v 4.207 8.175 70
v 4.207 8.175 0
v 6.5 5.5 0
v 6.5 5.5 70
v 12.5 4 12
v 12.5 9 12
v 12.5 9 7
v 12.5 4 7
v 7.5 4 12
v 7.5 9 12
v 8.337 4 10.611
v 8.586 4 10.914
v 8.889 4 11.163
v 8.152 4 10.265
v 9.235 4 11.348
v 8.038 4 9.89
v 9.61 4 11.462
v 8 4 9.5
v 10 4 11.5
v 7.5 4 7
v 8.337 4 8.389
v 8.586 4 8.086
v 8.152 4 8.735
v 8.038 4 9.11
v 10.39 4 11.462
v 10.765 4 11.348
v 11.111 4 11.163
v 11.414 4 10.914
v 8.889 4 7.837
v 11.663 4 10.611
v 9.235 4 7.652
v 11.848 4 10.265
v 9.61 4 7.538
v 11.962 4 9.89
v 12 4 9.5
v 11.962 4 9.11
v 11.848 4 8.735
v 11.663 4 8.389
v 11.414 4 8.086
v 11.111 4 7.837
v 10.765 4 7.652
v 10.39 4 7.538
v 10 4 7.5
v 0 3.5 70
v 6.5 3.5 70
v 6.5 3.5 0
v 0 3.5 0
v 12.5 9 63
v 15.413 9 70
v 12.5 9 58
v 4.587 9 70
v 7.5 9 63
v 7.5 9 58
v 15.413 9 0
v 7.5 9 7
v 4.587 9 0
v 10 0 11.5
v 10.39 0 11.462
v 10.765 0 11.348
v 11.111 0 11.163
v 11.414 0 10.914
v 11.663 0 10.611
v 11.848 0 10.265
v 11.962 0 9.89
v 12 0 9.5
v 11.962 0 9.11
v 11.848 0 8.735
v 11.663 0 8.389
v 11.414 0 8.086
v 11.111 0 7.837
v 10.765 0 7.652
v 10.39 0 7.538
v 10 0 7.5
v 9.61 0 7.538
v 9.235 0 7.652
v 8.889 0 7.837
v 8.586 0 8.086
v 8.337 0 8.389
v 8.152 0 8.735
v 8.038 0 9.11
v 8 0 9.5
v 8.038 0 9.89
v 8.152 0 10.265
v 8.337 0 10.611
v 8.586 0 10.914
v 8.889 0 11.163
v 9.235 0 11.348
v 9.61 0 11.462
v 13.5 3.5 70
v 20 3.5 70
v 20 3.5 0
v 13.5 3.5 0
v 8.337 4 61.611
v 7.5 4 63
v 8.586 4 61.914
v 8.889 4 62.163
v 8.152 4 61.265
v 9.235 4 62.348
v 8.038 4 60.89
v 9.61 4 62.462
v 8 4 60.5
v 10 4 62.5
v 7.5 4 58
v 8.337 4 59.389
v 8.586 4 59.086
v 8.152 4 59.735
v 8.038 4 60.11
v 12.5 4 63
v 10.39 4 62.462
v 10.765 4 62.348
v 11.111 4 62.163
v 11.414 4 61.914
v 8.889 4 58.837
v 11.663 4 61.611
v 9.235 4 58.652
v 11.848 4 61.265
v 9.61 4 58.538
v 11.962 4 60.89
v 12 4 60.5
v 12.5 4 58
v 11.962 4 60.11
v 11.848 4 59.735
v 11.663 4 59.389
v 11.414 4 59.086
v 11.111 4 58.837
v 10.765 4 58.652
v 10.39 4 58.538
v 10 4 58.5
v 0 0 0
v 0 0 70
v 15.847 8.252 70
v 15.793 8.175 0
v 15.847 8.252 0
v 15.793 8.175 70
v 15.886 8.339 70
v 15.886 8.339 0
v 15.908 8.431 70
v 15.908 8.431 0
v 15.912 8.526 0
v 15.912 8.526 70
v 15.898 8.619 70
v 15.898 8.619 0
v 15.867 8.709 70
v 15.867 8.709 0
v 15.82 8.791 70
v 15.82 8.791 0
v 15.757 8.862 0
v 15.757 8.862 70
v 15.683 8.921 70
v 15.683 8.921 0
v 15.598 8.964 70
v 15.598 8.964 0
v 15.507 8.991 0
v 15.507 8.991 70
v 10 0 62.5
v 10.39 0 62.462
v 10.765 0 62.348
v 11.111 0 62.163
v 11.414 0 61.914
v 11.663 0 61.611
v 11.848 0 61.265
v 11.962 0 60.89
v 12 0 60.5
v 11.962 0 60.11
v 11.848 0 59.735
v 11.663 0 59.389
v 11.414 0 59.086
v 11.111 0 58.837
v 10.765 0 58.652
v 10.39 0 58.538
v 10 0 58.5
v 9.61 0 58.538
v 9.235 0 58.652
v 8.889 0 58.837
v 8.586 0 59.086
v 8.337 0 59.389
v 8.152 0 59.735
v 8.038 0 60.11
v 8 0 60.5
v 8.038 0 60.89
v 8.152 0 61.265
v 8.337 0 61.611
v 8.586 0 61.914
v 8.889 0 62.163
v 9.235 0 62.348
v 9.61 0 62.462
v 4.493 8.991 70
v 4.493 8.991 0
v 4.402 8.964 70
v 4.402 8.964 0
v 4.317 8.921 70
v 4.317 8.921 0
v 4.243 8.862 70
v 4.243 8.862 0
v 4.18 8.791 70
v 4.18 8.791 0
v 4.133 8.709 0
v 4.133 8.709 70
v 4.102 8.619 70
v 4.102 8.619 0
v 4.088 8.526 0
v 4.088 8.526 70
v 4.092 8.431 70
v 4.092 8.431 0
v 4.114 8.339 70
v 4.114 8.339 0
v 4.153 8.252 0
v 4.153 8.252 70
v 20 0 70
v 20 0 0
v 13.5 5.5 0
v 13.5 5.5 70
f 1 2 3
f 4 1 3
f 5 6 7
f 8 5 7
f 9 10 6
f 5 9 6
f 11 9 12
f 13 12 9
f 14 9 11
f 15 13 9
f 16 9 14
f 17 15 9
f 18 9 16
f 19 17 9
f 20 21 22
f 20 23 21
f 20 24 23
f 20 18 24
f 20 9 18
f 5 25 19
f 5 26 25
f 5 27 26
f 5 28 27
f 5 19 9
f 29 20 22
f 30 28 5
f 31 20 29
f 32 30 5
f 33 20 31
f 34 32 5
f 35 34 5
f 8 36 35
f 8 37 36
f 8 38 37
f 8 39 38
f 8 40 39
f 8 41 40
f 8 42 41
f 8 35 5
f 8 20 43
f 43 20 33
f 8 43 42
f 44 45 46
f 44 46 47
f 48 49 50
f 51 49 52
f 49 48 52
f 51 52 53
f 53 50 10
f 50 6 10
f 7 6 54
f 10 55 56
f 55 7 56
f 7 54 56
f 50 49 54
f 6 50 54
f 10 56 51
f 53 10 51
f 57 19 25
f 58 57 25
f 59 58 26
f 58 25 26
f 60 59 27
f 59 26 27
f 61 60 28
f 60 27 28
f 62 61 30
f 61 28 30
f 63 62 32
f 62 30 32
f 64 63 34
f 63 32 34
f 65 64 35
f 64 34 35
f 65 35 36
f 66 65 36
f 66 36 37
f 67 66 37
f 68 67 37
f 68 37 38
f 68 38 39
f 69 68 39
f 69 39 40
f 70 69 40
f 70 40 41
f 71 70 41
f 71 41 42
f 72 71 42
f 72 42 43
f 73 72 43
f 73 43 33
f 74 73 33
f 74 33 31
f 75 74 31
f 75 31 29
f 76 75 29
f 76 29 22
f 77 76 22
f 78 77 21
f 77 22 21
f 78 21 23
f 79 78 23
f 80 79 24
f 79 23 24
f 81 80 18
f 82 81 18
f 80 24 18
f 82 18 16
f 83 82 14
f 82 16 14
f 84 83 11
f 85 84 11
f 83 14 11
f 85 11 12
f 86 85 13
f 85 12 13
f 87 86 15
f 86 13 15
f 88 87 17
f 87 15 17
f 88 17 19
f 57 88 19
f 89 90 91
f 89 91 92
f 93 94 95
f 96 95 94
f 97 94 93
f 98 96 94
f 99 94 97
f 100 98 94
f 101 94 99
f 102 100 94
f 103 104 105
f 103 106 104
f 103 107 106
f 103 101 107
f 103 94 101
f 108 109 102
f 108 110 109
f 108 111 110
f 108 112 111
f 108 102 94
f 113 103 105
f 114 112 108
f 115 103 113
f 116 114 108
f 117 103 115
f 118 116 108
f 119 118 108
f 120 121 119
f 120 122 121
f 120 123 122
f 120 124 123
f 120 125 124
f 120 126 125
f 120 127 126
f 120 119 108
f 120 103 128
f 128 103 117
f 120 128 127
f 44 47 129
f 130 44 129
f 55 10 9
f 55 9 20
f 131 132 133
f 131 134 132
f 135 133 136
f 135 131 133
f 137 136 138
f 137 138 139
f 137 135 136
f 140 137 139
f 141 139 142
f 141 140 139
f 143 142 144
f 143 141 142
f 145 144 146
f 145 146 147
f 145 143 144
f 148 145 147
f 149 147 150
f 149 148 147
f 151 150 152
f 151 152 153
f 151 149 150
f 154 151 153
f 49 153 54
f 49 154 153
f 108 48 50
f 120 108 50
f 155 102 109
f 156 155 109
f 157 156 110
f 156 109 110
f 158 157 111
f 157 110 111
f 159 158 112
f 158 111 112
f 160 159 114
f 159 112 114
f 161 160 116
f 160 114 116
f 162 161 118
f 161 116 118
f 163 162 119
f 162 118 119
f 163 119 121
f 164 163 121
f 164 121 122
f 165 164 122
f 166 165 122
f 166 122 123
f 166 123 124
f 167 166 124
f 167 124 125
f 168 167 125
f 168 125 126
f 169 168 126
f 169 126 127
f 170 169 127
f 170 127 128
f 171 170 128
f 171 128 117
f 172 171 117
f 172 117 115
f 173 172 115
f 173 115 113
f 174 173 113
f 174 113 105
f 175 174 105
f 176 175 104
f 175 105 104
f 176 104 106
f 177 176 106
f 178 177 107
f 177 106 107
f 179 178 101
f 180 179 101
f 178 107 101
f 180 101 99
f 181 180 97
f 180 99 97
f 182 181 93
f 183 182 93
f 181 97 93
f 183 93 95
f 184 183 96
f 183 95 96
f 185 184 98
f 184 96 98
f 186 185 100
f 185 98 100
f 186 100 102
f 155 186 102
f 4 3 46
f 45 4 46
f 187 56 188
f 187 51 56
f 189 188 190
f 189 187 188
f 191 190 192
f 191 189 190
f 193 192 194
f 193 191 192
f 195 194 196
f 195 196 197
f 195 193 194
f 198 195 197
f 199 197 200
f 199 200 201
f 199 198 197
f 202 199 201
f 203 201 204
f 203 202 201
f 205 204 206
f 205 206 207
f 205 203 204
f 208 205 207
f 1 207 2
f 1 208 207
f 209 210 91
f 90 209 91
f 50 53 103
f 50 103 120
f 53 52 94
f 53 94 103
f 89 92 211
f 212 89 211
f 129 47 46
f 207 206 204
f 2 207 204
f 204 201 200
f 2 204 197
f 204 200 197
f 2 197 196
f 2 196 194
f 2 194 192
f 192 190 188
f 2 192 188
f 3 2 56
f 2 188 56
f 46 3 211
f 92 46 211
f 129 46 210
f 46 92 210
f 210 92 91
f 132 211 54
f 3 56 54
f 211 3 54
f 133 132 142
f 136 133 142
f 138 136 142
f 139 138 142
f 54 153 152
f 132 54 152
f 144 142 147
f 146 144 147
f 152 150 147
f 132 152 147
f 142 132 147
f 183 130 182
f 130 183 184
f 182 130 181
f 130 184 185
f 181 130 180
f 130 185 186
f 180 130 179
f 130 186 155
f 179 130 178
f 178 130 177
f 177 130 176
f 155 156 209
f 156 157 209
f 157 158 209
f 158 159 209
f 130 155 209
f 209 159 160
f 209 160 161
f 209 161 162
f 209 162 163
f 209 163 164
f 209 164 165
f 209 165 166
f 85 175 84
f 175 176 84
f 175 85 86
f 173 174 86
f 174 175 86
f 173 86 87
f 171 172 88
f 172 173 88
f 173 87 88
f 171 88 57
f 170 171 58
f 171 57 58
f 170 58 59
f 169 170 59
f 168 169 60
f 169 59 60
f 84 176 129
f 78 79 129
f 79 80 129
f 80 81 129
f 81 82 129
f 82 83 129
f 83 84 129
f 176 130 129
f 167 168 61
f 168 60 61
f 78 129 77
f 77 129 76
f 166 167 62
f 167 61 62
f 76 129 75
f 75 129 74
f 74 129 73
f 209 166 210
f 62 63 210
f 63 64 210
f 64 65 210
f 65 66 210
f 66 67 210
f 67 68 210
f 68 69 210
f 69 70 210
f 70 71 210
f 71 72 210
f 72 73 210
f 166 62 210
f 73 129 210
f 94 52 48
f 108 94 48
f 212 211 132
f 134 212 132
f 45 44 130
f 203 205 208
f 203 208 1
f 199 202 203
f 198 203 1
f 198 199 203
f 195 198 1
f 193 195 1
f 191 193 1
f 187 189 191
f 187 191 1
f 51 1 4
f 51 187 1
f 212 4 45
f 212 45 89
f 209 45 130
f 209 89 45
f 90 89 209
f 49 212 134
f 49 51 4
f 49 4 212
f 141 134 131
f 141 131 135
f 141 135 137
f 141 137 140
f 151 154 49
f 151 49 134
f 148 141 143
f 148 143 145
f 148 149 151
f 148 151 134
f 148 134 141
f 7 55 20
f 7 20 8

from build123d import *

# Parameters (mm, degrees)
BOSS_EXTRUDE1_DEPTH = 70
FILLET3_R           = 0.5
FILLET4_R           = 0.5
SKETCH2_W           = 5
SKETCH2_H           = 5
CUT_EXTRUDE1_DEPTH  = 5
SKETCH3_R           = 2
CUT_EXTRUDE2_DEPTH  = 73.972597597


with BuildPart() as part:
    # Sketch1 → Boss-Extrude1 (new body)
    with BuildSketch(Plane.XY):
        Polygon((0, 0), (20, 0), (20, 3.5), (13.5, 3.5), (13.5, 5.5), (16.5, 9), (3.5, 9), (6.5, 5.5), (6.5, 3.5), (0, 3.5), align=None)
    extrude(amount=BOSS_EXTRUDE1_DEPTH)

    # Fillet3
    fillet3_edges = [part.edges().sort_by_distance(p)[0] for p in [
        (16.5, 9, 35),
    ]]
    fillet(fillet3_edges, radius=FILLET3_R)

    # Fillet4
    fillet4_edges = [part.edges().sort_by_distance(p)[0] for p in [
        (3.5, 9, 35),
    ]]
    fillet(fillet4_edges, radius=FILLET4_R)

    # Sketch2 → Cut-Extrude1 (cut)
    with BuildSketch(Plane(origin=(0, 9, 0), x_dir=(1, 0, 0), z_dir=(0, 1, 0))):
        with Locations((10, -9.5)):
            Rectangle(SKETCH2_W, SKETCH2_H)
        with Locations((10, -60.5)):
            Rectangle(SKETCH2_W, SKETCH2_H)
    extrude(amount=-CUT_EXTRUDE1_DEPTH, mode=Mode.SUBTRACT)

    # Sketch3 → Cut-Extrude2 (cut, through all)
    with BuildSketch(Plane(origin=(0, 4, 0), x_dir=(1, 0, 0), z_dir=(0, 1, 0))):
        with Locations(Location((10, -9.5, 0), (0, 0, 270))):
            Circle(SKETCH3_R)
        with Locations(Location((10, -60.5, 0), (0, 0, 270))):
            Circle(SKETCH3_R)
    extrude(amount=-CUT_EXTRUDE2_DEPTH, mode=Mode.SUBTRACT)


solid = part.part
